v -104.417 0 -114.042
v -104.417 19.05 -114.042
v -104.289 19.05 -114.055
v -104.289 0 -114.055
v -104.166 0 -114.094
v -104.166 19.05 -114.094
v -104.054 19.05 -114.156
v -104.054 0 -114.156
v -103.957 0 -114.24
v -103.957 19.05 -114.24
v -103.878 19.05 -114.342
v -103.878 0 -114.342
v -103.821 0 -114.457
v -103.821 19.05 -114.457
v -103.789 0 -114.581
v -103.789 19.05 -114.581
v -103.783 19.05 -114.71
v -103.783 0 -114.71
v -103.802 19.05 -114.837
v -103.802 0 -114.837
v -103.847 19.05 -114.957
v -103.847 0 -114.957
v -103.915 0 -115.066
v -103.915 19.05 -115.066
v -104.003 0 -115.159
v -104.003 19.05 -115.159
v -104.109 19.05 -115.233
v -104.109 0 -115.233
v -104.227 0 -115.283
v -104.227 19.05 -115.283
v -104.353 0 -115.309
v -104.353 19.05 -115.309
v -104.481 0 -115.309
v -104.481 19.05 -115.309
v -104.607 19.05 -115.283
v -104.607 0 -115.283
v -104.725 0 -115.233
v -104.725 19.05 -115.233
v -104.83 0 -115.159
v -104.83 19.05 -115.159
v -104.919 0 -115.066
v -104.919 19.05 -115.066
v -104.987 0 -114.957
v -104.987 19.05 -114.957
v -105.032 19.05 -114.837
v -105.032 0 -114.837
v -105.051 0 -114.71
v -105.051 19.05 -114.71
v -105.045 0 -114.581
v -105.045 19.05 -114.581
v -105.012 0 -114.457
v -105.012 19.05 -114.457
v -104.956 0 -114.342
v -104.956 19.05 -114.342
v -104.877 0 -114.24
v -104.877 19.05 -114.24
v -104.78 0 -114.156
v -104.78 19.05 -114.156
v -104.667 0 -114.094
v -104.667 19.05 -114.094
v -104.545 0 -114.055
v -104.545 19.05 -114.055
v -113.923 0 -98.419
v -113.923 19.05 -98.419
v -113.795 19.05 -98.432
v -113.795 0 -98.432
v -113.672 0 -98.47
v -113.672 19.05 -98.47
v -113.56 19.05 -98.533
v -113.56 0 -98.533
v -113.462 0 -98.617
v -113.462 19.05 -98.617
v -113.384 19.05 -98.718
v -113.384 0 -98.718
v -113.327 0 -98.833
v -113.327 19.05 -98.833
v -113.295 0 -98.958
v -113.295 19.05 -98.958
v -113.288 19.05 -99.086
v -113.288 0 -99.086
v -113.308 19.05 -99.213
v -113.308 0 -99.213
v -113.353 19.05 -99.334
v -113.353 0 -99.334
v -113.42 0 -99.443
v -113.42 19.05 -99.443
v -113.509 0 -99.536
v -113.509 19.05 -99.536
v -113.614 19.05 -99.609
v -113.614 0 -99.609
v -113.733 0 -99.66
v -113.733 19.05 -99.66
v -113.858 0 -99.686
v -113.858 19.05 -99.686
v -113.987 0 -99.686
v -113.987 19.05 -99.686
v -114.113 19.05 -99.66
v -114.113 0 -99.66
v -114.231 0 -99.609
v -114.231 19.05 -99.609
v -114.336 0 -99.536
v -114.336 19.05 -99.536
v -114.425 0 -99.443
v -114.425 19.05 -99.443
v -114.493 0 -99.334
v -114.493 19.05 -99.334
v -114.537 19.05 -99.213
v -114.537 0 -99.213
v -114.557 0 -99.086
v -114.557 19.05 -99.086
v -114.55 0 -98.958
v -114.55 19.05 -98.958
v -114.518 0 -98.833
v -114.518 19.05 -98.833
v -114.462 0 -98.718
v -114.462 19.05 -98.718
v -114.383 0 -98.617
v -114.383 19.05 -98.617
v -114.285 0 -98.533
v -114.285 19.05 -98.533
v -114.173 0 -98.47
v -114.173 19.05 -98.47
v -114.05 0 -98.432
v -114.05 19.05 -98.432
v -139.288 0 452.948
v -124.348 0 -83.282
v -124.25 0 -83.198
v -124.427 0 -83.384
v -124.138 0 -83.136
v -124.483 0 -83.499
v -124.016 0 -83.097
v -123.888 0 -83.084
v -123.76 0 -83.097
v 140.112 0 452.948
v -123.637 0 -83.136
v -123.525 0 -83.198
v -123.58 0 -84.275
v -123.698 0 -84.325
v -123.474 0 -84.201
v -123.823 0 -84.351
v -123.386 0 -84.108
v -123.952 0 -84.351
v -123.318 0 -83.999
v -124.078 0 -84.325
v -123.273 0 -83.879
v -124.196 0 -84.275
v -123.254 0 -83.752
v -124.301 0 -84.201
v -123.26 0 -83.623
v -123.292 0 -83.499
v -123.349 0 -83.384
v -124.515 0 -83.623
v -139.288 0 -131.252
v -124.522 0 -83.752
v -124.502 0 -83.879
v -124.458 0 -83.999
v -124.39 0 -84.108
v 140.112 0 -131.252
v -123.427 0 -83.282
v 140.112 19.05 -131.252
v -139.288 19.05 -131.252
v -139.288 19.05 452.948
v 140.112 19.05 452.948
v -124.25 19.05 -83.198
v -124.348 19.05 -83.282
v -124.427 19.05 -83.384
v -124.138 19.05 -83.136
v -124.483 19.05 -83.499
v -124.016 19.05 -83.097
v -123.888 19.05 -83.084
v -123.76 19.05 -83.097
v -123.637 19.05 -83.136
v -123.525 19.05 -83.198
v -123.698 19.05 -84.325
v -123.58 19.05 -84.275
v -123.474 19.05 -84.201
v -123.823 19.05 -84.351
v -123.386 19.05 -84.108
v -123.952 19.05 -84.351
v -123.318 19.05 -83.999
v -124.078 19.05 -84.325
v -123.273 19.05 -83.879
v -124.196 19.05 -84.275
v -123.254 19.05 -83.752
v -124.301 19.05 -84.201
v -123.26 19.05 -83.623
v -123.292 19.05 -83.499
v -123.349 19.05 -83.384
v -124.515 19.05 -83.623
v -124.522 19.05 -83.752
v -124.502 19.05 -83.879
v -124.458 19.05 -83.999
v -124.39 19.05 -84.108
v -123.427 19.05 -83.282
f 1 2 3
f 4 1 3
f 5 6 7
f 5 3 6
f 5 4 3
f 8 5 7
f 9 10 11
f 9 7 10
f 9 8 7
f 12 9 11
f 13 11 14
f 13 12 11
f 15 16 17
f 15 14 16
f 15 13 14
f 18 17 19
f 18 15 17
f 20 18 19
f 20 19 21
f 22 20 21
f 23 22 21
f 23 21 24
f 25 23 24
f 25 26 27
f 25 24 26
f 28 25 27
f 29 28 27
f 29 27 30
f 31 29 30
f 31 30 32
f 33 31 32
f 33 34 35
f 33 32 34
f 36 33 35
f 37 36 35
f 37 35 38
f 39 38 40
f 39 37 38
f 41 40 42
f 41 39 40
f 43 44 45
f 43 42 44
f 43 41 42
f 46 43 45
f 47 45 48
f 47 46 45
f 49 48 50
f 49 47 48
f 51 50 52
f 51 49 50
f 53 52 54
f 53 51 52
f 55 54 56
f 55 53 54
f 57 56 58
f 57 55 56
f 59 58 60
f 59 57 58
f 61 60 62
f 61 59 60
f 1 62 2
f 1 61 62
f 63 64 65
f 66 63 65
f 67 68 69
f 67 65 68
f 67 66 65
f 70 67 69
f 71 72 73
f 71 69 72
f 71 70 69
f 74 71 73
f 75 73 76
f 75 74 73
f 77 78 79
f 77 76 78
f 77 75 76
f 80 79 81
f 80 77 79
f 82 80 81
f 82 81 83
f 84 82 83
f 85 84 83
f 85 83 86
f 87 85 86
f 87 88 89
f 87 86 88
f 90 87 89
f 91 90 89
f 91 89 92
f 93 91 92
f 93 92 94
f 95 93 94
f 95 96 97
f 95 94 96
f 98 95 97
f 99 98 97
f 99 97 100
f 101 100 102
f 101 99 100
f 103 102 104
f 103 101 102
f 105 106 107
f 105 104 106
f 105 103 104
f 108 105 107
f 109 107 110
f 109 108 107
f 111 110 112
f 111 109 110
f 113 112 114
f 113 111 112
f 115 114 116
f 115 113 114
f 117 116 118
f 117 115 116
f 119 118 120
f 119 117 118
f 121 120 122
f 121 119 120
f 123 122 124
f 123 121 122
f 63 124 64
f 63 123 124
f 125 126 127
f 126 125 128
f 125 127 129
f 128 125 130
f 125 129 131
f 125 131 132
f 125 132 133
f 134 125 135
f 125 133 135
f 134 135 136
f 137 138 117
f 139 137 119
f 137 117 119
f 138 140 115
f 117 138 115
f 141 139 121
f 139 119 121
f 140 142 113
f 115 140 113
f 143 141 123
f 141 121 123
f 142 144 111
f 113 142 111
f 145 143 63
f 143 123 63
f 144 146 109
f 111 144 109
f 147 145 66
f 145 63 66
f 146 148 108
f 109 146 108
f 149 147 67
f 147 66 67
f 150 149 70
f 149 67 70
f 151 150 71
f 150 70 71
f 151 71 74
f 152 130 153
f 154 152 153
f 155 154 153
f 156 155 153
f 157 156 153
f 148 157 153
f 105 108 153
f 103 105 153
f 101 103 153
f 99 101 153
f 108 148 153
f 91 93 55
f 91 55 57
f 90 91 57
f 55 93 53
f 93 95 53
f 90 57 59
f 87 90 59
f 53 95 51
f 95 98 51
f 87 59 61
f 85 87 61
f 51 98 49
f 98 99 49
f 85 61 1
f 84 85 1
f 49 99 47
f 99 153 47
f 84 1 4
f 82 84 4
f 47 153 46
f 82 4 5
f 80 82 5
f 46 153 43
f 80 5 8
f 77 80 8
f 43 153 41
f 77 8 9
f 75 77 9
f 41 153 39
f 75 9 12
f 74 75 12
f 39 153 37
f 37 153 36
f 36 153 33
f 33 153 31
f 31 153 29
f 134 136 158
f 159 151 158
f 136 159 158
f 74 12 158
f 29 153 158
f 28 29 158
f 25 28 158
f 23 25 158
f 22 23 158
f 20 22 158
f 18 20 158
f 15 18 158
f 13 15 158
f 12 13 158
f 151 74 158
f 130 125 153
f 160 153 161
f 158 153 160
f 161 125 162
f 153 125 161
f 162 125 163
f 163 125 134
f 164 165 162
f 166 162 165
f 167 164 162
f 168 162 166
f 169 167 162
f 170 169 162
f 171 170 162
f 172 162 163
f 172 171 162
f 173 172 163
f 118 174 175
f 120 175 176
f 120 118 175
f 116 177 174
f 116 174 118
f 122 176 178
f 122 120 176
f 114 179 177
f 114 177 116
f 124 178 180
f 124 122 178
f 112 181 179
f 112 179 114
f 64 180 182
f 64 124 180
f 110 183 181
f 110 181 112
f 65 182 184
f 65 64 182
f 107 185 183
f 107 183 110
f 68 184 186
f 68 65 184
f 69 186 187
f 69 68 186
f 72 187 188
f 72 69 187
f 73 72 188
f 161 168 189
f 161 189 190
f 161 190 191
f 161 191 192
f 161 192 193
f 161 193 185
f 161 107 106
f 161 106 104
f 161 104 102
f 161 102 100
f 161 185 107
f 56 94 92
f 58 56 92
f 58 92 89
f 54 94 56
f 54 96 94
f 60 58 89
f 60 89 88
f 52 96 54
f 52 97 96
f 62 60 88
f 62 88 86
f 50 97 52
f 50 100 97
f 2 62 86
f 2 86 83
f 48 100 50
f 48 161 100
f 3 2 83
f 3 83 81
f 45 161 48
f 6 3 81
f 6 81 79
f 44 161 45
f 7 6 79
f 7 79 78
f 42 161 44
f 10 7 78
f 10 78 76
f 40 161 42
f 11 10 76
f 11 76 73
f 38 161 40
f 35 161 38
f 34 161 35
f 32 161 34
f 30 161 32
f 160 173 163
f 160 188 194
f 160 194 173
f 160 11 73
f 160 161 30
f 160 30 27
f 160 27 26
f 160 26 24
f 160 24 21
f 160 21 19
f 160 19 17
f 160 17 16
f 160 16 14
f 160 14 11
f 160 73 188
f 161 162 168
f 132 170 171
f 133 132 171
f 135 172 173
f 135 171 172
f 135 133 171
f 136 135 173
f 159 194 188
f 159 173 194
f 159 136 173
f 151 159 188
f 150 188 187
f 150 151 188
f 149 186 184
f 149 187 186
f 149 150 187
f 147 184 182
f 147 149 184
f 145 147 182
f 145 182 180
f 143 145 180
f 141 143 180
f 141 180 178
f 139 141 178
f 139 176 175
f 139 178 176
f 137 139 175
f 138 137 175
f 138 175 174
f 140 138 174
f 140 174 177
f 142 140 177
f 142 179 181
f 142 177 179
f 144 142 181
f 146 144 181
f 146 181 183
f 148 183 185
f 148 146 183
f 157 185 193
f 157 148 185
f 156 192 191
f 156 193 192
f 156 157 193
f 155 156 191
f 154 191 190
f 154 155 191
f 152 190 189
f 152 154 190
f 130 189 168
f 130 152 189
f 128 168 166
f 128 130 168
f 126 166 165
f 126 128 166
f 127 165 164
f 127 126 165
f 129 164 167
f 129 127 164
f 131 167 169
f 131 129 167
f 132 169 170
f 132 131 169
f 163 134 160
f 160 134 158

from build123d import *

# Parameters (mm, degrees)
SKETCH1_W               = 279.4
SKETCH1_H               = 584.2
BOSS_EXTRUDE1_DEPTH     = 19.05
CUT_EXTRUDE1_DEPTH      = 475.506199549
CUT_EXTRUDE1_DEPTH_BACK = 475.506199549
SKETCH2_R               = 0.635


with BuildPart() as part:
    # Sketch1 → Boss-Extrude1 (new body)
    with BuildSketch(Plane(origin=(0, 0, 0), x_dir=(1, 0, 0), z_dir=(0, 1, 0))):
        with Locations((0.412094395, -160.847935103)):
            Rectangle(SKETCH1_W, SKETCH1_H)
    extrude(amount=BOSS_EXTRUDE1_DEPTH)

    # Sketch2 → Cut-Extrude1 (cut, two sides: drawn at the far end of the back side and taken through both)
    with BuildSketch(Plane(origin=(0, 19.05, 0), x_dir=(1, 0, 0), z_dir=(0, 1, 0)).offset(-CUT_EXTRUDE1_DEPTH_BACK)):
        with Locations(Location((-113.922633314, 99.053998407, 0), (0, 0, 270))):
            Circle(SKETCH2_R)
        with Locations(Location((-104.416850901, 114.677411757, 0), (0, 0, 270))):
            Circle(SKETCH2_R)
        with Locations(Location((-123.887731018, 83.719469664, 0), (0, 0, 270))):
            Circle(SKETCH2_R)
    extrude(amount=CUT_EXTRUDE1_DEPTH + CUT_EXTRUDE1_DEPTH_BACK, mode=Mode.SUBTRACT)


solid = part.part
